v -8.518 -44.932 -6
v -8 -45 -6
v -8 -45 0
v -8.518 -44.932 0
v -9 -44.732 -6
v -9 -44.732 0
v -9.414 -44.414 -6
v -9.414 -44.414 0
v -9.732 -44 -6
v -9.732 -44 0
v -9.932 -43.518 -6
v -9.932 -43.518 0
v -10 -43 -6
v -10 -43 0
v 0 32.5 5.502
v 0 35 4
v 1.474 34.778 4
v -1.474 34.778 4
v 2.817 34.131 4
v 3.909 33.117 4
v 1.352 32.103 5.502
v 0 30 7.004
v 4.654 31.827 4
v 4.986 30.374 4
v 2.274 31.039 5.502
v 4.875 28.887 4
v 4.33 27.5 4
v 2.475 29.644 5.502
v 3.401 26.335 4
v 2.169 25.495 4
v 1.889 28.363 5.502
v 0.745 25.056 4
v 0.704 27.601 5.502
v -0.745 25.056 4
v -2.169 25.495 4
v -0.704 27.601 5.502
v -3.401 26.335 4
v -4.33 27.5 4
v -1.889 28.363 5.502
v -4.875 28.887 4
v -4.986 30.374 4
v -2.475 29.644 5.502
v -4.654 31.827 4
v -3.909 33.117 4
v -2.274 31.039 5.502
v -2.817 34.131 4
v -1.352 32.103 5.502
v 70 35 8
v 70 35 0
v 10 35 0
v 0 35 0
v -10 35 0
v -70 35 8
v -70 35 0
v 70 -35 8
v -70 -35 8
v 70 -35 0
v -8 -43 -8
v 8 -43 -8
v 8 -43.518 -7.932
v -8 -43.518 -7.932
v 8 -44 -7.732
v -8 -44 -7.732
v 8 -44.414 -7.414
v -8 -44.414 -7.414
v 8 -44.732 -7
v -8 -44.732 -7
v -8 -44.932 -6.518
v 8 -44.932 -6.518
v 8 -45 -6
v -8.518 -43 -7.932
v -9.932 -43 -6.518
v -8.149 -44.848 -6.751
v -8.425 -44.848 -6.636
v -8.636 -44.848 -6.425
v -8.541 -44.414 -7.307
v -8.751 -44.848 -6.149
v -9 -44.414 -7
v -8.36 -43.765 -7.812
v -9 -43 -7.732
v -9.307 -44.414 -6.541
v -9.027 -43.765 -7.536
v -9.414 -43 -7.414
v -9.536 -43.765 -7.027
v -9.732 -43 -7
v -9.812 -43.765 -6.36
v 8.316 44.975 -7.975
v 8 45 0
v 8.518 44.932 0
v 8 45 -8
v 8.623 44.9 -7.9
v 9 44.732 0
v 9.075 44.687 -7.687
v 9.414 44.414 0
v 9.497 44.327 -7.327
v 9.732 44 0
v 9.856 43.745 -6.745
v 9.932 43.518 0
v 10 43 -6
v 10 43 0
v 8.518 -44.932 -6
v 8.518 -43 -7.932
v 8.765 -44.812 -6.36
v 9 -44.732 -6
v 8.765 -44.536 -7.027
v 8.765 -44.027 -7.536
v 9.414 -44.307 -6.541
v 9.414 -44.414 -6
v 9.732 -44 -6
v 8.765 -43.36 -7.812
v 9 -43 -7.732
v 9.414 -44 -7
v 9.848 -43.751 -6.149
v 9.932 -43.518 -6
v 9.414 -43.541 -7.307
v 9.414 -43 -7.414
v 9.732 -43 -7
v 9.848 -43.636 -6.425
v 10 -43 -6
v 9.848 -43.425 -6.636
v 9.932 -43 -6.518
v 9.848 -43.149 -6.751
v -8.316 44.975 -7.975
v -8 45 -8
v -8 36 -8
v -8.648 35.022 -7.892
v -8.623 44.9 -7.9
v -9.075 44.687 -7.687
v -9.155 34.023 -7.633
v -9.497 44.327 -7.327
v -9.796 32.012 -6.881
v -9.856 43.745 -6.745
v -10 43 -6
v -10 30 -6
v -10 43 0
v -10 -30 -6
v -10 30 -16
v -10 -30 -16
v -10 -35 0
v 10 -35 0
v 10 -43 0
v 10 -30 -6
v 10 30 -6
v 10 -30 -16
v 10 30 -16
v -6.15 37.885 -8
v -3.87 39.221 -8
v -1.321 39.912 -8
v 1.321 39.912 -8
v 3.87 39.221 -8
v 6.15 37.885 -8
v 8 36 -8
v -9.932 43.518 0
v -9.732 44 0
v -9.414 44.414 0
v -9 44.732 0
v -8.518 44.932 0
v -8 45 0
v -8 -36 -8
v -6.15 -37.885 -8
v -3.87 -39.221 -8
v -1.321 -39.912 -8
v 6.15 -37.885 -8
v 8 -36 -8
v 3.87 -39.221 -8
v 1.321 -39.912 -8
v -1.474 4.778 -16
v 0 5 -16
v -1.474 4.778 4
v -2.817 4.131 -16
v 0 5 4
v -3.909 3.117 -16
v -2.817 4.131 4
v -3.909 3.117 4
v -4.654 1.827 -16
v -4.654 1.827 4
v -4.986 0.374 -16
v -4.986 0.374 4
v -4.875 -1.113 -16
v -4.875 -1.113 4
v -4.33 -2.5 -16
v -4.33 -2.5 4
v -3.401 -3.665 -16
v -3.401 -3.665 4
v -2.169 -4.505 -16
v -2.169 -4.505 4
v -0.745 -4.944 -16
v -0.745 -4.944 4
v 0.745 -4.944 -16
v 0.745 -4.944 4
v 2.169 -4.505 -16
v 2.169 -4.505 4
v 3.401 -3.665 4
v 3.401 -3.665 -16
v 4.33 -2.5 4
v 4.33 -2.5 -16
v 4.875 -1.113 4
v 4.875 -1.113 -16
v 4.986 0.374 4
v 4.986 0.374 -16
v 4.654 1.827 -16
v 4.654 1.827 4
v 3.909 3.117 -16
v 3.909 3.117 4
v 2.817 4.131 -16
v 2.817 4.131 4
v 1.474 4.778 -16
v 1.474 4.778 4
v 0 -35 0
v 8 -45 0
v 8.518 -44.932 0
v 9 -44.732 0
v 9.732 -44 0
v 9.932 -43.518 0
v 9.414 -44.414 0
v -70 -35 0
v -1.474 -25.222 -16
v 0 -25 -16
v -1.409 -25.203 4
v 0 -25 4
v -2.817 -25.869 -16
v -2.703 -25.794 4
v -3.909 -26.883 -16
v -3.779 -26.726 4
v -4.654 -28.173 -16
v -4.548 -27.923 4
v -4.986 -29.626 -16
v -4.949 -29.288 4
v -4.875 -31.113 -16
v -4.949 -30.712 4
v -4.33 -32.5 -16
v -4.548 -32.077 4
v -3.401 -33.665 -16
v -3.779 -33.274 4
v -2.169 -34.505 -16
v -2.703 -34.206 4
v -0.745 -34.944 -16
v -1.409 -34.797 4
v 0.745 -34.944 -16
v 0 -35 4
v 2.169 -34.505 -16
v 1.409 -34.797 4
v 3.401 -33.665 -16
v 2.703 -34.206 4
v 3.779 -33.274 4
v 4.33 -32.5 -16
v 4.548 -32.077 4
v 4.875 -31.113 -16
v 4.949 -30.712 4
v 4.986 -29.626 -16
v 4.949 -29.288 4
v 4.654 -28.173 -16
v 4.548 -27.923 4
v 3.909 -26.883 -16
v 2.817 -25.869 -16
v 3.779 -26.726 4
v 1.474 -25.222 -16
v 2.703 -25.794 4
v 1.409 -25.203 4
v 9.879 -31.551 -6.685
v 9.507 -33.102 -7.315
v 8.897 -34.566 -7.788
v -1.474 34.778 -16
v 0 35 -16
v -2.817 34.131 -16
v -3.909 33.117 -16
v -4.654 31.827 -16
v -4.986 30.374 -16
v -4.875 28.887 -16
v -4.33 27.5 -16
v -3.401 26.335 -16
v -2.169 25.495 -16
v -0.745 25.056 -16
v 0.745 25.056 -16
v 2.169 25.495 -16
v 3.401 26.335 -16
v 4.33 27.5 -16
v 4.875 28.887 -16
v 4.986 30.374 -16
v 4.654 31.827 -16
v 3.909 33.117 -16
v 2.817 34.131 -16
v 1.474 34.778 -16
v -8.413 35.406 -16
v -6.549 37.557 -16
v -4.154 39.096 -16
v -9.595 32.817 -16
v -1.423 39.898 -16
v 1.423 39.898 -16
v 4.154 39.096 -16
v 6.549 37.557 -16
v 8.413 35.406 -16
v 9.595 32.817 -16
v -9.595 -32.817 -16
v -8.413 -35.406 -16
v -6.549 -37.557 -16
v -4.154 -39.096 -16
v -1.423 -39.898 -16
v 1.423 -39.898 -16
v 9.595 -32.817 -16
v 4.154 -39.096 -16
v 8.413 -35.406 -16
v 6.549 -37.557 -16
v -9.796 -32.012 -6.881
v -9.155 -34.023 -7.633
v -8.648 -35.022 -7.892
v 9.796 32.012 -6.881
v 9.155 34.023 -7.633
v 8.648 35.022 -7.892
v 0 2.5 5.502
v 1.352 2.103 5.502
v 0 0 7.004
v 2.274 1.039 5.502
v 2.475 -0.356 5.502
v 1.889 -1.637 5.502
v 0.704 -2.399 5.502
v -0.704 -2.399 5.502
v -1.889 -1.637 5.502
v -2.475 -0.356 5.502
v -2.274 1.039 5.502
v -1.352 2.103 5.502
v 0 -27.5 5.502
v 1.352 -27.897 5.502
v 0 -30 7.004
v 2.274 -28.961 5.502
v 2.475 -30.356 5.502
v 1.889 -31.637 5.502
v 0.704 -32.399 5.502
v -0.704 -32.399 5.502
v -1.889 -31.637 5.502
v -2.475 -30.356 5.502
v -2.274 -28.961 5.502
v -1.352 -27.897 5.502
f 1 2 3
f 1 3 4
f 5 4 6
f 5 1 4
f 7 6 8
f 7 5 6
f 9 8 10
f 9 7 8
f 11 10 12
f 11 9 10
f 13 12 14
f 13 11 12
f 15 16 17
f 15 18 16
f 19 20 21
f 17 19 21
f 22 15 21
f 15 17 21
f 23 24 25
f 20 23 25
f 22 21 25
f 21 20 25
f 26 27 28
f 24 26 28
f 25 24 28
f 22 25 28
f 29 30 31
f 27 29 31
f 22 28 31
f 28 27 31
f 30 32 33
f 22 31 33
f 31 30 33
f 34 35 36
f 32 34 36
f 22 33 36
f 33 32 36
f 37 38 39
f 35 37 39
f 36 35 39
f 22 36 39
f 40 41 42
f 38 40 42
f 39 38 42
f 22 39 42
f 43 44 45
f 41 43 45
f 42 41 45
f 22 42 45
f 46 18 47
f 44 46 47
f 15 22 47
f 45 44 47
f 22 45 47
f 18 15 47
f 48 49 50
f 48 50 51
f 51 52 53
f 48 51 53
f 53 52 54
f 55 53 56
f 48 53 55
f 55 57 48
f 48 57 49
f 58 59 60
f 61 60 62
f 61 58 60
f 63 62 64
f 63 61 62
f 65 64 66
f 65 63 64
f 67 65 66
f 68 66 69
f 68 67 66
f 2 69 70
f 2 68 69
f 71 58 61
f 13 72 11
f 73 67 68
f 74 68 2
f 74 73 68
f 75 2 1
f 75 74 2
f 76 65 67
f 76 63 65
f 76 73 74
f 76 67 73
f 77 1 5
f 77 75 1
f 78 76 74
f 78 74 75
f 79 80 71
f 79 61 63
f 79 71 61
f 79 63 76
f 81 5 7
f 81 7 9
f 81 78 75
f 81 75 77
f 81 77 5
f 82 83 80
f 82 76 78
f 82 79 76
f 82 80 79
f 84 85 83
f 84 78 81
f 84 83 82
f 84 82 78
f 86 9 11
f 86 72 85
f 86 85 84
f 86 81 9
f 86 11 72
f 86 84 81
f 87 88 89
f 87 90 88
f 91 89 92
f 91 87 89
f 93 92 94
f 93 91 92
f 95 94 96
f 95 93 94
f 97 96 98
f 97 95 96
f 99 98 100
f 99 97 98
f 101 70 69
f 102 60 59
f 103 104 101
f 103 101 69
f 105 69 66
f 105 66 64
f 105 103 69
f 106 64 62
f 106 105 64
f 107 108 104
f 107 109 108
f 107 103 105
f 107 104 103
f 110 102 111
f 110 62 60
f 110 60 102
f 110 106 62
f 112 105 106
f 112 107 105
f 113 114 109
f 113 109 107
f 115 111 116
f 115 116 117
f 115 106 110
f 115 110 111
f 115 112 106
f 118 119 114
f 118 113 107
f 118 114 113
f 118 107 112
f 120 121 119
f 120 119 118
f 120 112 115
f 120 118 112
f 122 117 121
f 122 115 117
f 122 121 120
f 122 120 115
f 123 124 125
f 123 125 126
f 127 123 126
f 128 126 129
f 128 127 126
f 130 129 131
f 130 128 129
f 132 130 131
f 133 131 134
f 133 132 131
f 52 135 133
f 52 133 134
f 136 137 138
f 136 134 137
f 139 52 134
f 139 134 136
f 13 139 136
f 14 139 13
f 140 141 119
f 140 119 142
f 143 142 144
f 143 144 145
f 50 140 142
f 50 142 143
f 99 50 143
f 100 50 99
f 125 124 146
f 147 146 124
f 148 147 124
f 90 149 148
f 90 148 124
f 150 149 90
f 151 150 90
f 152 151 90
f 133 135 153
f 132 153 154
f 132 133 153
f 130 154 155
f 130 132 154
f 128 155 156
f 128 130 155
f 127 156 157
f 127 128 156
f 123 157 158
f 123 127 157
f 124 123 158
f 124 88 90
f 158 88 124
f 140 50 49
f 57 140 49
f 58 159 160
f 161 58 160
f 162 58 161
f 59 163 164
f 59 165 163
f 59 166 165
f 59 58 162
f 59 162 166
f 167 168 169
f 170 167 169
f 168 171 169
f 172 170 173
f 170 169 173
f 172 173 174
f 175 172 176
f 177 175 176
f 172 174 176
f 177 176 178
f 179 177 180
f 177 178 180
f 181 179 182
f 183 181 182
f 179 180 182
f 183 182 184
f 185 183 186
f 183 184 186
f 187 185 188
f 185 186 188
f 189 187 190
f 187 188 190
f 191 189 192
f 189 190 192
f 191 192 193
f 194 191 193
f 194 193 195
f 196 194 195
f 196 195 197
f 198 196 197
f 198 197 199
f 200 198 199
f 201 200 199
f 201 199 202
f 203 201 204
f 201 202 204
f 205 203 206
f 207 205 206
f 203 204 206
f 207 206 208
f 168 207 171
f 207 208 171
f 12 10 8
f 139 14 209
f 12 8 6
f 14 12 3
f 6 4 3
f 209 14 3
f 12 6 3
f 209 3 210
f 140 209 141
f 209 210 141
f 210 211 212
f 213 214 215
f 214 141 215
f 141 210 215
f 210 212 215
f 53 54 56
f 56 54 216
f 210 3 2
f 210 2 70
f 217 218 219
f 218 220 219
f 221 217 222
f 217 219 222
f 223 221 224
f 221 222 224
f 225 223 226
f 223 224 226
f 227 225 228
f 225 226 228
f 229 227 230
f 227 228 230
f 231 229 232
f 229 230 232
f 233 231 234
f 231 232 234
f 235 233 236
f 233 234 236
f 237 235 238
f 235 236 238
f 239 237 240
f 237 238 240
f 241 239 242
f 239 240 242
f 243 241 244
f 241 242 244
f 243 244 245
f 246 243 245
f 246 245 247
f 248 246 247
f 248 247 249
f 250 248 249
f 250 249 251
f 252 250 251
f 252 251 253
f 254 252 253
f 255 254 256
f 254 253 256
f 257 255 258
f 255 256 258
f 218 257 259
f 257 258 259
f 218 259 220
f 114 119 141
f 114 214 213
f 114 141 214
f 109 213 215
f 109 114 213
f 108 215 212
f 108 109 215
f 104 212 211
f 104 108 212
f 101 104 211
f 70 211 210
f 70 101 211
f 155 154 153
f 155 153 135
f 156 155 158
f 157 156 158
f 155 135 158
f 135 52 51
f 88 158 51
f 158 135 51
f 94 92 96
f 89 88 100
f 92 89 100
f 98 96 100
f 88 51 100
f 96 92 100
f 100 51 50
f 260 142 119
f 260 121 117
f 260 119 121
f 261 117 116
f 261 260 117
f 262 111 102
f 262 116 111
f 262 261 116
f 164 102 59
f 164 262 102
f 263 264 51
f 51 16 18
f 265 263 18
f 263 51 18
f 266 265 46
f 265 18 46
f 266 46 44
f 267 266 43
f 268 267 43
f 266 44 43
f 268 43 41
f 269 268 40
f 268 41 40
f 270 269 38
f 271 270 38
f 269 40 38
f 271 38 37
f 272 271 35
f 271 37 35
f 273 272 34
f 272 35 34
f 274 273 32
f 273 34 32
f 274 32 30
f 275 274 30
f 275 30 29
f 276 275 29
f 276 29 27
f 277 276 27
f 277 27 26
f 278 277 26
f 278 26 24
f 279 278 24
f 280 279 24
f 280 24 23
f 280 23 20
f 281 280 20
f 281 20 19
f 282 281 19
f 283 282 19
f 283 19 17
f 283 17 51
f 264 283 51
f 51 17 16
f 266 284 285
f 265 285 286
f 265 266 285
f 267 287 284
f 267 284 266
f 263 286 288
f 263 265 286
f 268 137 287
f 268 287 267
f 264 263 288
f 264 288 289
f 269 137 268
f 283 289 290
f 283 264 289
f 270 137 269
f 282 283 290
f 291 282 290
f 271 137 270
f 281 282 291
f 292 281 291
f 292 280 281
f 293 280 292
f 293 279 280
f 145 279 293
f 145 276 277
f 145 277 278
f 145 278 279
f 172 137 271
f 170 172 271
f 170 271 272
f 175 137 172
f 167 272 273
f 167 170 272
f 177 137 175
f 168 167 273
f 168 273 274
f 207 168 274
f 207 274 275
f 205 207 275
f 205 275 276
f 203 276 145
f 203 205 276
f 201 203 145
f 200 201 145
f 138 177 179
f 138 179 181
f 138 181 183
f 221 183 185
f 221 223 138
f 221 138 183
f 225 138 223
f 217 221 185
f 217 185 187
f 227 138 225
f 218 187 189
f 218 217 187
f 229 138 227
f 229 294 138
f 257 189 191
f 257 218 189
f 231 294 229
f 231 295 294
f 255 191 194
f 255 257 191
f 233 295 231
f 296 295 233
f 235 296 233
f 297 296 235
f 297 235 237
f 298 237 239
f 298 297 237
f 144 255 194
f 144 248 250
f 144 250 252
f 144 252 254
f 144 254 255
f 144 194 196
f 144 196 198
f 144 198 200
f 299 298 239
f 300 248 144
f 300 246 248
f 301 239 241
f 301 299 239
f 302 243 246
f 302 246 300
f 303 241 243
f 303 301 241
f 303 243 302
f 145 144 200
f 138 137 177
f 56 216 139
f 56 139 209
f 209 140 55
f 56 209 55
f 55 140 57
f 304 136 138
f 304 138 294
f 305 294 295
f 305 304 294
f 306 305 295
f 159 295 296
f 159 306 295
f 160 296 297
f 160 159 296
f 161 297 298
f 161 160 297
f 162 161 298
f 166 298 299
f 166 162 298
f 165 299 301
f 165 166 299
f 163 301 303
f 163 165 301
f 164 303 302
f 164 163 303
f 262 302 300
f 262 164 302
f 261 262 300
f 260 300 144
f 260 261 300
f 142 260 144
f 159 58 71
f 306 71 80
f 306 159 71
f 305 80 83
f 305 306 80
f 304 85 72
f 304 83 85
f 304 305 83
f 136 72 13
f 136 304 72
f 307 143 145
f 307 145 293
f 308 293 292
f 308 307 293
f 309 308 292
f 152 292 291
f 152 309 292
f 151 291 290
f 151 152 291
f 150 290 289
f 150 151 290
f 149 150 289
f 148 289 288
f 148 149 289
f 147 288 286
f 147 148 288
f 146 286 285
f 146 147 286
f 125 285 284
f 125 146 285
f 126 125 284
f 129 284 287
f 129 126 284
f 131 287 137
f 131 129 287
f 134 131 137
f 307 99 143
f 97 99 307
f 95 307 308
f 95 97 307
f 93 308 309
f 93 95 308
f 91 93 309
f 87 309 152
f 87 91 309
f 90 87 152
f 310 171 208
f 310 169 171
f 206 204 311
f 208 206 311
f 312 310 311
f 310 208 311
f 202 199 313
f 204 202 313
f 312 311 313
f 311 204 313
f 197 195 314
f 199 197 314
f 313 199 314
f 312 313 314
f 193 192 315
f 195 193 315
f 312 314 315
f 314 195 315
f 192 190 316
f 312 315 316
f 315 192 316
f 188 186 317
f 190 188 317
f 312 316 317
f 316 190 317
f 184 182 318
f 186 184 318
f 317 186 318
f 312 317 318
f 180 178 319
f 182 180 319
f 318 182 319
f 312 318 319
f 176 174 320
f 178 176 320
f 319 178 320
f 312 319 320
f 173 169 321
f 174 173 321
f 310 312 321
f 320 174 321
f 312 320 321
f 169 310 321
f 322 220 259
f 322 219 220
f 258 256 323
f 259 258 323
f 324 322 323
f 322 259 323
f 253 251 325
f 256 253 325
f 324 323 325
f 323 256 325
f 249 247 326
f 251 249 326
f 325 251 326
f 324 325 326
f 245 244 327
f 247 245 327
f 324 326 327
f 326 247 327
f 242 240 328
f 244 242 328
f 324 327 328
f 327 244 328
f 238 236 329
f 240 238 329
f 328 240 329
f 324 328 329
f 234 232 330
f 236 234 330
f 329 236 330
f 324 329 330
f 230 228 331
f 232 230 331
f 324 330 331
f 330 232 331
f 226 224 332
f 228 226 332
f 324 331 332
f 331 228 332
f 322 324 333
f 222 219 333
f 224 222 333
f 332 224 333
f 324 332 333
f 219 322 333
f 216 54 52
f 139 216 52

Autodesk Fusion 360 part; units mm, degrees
sketch "rectangle" plane through (0, 0, 0) normal (0, 0, 1) x (1, 0, 0)
  line L0 (70, 35) -> (-70, 35)
  line L1 (-70, 35) -> (-70, -35)
  line L2 (-70, -35) -> (70, -35)
  line L3 (70, -35) -> (70, 35)
  line L4 (70, 35) -> (-70, -35) construction
  line L5 (-70, 35) -> (70, -35) construction
  dimension "d1" = 70
  dimension "d2" = 140
extrude "Extrude1" add sketch "rectangle" along normal blind 8
sketch "Sketch2" plane through (0, 0, 0) normal (0, 0, -1) x (1, 0, 0)
  line L0 (70, -35) -> (70, 35)
  line L1 (70, 35) -> (-70, 35)
  line L2 (-70, 35) -> (-70, -35)
  line L3 (-70, -35) -> (70, -35)
  line L4 (10, -45) -> (-10, -45)
  line L5 (-10, -45) -> (-10, 45)
  line L6 (-10, 45) -> (10, 45)
  line L7 (10, 45) -> (10, -45)
  line L8 (-6, 39) -> (-6, 21.0153)
  arc A0 (-6, 21.0153) -> (6, 21.0153) centre (0, 21.0153) ccw
  line L9 (6, 21.0153) -> (6, 39)
  arc A1 (6, 39) -> (-6, 39) centre (0, 39) ccw
  line L10 (0, 45) -> (0, 15.0153) construction
  dimension "d5" = 90
  dimension "d8" = 12
extrude "Extrude2" add sketch "Sketch2" along normal blind 8 contours L3 L4 L5 L7 | L1 L3 L5 L7 L8 A0 L9 | L1 L6 L7 L9 A1 | L1 L8 A0 L9 | L1 L8 L9 A1 | L1 L5 L6 L8 A1
sketch "Sketch3" plane through (0, 0, -8) normal (0, 0, -1) x (1, 0, 0)
  line L0 (10, 45) -> (-10, 45)
  line L1 (-10, 45) -> (-10, -45)
  line L2 (-10, -45) -> (10, -45)
  line L3 (10, -45) -> (10, 45)
  line L4 (10, -30) -> (10, 30)
  arc A0 (10, 30) -> (-10, 30) centre (0, 30) ccw
  line L5 (-10, 30) -> (-10, -30)
  arc A1 (-10, -30) -> (10, -30) centre (0, -30) ccw
  line L6 (0, -30) -> (0, 30) construction
extrude "Extrude3" add sketch "Sketch3" along normal blind 8 contours L1 L3 L4 A0 L5 A1
sketch "Sketch4" plane through (0, 0, -8) normal (0, 0, -1) x (1, 0, 0)
  arc A0 (-10, -30) -> (10, -30) centre (0, -30) ccw
  line L0 (-10, -45) -> (10, -45)
hole "Hole1" at (0, -30, -16) direction (0, 0, 1) diameter 10 depth 20 tip angle 118
hole "Hole2" at (0, 30, -16) direction (0, 0, 1) diameter 10 depth 20 tip angle 118
hole "Hole3" at (0, 0, -16) direction (0, 0, 1) diameter 10 depth 20 tip angle 118
fillet "Fillet1" radius 2 3 edges at (-10, -37.5, -8) (-10, -45, -4) (0, -45, -8)
fillet "Fillet2" radius 2 3 edges at (10, -45, -3) (10, -44.4142, -7.4142) (10, -36.5, -8)
fillet "Fillet3" radius 2 2 edges at (-10, 37.5, -8) (-10, 45, -4)
fillet "Fillet4" radius 2 2 edges at (10, 37.5, -8) (10, 45, -4)
